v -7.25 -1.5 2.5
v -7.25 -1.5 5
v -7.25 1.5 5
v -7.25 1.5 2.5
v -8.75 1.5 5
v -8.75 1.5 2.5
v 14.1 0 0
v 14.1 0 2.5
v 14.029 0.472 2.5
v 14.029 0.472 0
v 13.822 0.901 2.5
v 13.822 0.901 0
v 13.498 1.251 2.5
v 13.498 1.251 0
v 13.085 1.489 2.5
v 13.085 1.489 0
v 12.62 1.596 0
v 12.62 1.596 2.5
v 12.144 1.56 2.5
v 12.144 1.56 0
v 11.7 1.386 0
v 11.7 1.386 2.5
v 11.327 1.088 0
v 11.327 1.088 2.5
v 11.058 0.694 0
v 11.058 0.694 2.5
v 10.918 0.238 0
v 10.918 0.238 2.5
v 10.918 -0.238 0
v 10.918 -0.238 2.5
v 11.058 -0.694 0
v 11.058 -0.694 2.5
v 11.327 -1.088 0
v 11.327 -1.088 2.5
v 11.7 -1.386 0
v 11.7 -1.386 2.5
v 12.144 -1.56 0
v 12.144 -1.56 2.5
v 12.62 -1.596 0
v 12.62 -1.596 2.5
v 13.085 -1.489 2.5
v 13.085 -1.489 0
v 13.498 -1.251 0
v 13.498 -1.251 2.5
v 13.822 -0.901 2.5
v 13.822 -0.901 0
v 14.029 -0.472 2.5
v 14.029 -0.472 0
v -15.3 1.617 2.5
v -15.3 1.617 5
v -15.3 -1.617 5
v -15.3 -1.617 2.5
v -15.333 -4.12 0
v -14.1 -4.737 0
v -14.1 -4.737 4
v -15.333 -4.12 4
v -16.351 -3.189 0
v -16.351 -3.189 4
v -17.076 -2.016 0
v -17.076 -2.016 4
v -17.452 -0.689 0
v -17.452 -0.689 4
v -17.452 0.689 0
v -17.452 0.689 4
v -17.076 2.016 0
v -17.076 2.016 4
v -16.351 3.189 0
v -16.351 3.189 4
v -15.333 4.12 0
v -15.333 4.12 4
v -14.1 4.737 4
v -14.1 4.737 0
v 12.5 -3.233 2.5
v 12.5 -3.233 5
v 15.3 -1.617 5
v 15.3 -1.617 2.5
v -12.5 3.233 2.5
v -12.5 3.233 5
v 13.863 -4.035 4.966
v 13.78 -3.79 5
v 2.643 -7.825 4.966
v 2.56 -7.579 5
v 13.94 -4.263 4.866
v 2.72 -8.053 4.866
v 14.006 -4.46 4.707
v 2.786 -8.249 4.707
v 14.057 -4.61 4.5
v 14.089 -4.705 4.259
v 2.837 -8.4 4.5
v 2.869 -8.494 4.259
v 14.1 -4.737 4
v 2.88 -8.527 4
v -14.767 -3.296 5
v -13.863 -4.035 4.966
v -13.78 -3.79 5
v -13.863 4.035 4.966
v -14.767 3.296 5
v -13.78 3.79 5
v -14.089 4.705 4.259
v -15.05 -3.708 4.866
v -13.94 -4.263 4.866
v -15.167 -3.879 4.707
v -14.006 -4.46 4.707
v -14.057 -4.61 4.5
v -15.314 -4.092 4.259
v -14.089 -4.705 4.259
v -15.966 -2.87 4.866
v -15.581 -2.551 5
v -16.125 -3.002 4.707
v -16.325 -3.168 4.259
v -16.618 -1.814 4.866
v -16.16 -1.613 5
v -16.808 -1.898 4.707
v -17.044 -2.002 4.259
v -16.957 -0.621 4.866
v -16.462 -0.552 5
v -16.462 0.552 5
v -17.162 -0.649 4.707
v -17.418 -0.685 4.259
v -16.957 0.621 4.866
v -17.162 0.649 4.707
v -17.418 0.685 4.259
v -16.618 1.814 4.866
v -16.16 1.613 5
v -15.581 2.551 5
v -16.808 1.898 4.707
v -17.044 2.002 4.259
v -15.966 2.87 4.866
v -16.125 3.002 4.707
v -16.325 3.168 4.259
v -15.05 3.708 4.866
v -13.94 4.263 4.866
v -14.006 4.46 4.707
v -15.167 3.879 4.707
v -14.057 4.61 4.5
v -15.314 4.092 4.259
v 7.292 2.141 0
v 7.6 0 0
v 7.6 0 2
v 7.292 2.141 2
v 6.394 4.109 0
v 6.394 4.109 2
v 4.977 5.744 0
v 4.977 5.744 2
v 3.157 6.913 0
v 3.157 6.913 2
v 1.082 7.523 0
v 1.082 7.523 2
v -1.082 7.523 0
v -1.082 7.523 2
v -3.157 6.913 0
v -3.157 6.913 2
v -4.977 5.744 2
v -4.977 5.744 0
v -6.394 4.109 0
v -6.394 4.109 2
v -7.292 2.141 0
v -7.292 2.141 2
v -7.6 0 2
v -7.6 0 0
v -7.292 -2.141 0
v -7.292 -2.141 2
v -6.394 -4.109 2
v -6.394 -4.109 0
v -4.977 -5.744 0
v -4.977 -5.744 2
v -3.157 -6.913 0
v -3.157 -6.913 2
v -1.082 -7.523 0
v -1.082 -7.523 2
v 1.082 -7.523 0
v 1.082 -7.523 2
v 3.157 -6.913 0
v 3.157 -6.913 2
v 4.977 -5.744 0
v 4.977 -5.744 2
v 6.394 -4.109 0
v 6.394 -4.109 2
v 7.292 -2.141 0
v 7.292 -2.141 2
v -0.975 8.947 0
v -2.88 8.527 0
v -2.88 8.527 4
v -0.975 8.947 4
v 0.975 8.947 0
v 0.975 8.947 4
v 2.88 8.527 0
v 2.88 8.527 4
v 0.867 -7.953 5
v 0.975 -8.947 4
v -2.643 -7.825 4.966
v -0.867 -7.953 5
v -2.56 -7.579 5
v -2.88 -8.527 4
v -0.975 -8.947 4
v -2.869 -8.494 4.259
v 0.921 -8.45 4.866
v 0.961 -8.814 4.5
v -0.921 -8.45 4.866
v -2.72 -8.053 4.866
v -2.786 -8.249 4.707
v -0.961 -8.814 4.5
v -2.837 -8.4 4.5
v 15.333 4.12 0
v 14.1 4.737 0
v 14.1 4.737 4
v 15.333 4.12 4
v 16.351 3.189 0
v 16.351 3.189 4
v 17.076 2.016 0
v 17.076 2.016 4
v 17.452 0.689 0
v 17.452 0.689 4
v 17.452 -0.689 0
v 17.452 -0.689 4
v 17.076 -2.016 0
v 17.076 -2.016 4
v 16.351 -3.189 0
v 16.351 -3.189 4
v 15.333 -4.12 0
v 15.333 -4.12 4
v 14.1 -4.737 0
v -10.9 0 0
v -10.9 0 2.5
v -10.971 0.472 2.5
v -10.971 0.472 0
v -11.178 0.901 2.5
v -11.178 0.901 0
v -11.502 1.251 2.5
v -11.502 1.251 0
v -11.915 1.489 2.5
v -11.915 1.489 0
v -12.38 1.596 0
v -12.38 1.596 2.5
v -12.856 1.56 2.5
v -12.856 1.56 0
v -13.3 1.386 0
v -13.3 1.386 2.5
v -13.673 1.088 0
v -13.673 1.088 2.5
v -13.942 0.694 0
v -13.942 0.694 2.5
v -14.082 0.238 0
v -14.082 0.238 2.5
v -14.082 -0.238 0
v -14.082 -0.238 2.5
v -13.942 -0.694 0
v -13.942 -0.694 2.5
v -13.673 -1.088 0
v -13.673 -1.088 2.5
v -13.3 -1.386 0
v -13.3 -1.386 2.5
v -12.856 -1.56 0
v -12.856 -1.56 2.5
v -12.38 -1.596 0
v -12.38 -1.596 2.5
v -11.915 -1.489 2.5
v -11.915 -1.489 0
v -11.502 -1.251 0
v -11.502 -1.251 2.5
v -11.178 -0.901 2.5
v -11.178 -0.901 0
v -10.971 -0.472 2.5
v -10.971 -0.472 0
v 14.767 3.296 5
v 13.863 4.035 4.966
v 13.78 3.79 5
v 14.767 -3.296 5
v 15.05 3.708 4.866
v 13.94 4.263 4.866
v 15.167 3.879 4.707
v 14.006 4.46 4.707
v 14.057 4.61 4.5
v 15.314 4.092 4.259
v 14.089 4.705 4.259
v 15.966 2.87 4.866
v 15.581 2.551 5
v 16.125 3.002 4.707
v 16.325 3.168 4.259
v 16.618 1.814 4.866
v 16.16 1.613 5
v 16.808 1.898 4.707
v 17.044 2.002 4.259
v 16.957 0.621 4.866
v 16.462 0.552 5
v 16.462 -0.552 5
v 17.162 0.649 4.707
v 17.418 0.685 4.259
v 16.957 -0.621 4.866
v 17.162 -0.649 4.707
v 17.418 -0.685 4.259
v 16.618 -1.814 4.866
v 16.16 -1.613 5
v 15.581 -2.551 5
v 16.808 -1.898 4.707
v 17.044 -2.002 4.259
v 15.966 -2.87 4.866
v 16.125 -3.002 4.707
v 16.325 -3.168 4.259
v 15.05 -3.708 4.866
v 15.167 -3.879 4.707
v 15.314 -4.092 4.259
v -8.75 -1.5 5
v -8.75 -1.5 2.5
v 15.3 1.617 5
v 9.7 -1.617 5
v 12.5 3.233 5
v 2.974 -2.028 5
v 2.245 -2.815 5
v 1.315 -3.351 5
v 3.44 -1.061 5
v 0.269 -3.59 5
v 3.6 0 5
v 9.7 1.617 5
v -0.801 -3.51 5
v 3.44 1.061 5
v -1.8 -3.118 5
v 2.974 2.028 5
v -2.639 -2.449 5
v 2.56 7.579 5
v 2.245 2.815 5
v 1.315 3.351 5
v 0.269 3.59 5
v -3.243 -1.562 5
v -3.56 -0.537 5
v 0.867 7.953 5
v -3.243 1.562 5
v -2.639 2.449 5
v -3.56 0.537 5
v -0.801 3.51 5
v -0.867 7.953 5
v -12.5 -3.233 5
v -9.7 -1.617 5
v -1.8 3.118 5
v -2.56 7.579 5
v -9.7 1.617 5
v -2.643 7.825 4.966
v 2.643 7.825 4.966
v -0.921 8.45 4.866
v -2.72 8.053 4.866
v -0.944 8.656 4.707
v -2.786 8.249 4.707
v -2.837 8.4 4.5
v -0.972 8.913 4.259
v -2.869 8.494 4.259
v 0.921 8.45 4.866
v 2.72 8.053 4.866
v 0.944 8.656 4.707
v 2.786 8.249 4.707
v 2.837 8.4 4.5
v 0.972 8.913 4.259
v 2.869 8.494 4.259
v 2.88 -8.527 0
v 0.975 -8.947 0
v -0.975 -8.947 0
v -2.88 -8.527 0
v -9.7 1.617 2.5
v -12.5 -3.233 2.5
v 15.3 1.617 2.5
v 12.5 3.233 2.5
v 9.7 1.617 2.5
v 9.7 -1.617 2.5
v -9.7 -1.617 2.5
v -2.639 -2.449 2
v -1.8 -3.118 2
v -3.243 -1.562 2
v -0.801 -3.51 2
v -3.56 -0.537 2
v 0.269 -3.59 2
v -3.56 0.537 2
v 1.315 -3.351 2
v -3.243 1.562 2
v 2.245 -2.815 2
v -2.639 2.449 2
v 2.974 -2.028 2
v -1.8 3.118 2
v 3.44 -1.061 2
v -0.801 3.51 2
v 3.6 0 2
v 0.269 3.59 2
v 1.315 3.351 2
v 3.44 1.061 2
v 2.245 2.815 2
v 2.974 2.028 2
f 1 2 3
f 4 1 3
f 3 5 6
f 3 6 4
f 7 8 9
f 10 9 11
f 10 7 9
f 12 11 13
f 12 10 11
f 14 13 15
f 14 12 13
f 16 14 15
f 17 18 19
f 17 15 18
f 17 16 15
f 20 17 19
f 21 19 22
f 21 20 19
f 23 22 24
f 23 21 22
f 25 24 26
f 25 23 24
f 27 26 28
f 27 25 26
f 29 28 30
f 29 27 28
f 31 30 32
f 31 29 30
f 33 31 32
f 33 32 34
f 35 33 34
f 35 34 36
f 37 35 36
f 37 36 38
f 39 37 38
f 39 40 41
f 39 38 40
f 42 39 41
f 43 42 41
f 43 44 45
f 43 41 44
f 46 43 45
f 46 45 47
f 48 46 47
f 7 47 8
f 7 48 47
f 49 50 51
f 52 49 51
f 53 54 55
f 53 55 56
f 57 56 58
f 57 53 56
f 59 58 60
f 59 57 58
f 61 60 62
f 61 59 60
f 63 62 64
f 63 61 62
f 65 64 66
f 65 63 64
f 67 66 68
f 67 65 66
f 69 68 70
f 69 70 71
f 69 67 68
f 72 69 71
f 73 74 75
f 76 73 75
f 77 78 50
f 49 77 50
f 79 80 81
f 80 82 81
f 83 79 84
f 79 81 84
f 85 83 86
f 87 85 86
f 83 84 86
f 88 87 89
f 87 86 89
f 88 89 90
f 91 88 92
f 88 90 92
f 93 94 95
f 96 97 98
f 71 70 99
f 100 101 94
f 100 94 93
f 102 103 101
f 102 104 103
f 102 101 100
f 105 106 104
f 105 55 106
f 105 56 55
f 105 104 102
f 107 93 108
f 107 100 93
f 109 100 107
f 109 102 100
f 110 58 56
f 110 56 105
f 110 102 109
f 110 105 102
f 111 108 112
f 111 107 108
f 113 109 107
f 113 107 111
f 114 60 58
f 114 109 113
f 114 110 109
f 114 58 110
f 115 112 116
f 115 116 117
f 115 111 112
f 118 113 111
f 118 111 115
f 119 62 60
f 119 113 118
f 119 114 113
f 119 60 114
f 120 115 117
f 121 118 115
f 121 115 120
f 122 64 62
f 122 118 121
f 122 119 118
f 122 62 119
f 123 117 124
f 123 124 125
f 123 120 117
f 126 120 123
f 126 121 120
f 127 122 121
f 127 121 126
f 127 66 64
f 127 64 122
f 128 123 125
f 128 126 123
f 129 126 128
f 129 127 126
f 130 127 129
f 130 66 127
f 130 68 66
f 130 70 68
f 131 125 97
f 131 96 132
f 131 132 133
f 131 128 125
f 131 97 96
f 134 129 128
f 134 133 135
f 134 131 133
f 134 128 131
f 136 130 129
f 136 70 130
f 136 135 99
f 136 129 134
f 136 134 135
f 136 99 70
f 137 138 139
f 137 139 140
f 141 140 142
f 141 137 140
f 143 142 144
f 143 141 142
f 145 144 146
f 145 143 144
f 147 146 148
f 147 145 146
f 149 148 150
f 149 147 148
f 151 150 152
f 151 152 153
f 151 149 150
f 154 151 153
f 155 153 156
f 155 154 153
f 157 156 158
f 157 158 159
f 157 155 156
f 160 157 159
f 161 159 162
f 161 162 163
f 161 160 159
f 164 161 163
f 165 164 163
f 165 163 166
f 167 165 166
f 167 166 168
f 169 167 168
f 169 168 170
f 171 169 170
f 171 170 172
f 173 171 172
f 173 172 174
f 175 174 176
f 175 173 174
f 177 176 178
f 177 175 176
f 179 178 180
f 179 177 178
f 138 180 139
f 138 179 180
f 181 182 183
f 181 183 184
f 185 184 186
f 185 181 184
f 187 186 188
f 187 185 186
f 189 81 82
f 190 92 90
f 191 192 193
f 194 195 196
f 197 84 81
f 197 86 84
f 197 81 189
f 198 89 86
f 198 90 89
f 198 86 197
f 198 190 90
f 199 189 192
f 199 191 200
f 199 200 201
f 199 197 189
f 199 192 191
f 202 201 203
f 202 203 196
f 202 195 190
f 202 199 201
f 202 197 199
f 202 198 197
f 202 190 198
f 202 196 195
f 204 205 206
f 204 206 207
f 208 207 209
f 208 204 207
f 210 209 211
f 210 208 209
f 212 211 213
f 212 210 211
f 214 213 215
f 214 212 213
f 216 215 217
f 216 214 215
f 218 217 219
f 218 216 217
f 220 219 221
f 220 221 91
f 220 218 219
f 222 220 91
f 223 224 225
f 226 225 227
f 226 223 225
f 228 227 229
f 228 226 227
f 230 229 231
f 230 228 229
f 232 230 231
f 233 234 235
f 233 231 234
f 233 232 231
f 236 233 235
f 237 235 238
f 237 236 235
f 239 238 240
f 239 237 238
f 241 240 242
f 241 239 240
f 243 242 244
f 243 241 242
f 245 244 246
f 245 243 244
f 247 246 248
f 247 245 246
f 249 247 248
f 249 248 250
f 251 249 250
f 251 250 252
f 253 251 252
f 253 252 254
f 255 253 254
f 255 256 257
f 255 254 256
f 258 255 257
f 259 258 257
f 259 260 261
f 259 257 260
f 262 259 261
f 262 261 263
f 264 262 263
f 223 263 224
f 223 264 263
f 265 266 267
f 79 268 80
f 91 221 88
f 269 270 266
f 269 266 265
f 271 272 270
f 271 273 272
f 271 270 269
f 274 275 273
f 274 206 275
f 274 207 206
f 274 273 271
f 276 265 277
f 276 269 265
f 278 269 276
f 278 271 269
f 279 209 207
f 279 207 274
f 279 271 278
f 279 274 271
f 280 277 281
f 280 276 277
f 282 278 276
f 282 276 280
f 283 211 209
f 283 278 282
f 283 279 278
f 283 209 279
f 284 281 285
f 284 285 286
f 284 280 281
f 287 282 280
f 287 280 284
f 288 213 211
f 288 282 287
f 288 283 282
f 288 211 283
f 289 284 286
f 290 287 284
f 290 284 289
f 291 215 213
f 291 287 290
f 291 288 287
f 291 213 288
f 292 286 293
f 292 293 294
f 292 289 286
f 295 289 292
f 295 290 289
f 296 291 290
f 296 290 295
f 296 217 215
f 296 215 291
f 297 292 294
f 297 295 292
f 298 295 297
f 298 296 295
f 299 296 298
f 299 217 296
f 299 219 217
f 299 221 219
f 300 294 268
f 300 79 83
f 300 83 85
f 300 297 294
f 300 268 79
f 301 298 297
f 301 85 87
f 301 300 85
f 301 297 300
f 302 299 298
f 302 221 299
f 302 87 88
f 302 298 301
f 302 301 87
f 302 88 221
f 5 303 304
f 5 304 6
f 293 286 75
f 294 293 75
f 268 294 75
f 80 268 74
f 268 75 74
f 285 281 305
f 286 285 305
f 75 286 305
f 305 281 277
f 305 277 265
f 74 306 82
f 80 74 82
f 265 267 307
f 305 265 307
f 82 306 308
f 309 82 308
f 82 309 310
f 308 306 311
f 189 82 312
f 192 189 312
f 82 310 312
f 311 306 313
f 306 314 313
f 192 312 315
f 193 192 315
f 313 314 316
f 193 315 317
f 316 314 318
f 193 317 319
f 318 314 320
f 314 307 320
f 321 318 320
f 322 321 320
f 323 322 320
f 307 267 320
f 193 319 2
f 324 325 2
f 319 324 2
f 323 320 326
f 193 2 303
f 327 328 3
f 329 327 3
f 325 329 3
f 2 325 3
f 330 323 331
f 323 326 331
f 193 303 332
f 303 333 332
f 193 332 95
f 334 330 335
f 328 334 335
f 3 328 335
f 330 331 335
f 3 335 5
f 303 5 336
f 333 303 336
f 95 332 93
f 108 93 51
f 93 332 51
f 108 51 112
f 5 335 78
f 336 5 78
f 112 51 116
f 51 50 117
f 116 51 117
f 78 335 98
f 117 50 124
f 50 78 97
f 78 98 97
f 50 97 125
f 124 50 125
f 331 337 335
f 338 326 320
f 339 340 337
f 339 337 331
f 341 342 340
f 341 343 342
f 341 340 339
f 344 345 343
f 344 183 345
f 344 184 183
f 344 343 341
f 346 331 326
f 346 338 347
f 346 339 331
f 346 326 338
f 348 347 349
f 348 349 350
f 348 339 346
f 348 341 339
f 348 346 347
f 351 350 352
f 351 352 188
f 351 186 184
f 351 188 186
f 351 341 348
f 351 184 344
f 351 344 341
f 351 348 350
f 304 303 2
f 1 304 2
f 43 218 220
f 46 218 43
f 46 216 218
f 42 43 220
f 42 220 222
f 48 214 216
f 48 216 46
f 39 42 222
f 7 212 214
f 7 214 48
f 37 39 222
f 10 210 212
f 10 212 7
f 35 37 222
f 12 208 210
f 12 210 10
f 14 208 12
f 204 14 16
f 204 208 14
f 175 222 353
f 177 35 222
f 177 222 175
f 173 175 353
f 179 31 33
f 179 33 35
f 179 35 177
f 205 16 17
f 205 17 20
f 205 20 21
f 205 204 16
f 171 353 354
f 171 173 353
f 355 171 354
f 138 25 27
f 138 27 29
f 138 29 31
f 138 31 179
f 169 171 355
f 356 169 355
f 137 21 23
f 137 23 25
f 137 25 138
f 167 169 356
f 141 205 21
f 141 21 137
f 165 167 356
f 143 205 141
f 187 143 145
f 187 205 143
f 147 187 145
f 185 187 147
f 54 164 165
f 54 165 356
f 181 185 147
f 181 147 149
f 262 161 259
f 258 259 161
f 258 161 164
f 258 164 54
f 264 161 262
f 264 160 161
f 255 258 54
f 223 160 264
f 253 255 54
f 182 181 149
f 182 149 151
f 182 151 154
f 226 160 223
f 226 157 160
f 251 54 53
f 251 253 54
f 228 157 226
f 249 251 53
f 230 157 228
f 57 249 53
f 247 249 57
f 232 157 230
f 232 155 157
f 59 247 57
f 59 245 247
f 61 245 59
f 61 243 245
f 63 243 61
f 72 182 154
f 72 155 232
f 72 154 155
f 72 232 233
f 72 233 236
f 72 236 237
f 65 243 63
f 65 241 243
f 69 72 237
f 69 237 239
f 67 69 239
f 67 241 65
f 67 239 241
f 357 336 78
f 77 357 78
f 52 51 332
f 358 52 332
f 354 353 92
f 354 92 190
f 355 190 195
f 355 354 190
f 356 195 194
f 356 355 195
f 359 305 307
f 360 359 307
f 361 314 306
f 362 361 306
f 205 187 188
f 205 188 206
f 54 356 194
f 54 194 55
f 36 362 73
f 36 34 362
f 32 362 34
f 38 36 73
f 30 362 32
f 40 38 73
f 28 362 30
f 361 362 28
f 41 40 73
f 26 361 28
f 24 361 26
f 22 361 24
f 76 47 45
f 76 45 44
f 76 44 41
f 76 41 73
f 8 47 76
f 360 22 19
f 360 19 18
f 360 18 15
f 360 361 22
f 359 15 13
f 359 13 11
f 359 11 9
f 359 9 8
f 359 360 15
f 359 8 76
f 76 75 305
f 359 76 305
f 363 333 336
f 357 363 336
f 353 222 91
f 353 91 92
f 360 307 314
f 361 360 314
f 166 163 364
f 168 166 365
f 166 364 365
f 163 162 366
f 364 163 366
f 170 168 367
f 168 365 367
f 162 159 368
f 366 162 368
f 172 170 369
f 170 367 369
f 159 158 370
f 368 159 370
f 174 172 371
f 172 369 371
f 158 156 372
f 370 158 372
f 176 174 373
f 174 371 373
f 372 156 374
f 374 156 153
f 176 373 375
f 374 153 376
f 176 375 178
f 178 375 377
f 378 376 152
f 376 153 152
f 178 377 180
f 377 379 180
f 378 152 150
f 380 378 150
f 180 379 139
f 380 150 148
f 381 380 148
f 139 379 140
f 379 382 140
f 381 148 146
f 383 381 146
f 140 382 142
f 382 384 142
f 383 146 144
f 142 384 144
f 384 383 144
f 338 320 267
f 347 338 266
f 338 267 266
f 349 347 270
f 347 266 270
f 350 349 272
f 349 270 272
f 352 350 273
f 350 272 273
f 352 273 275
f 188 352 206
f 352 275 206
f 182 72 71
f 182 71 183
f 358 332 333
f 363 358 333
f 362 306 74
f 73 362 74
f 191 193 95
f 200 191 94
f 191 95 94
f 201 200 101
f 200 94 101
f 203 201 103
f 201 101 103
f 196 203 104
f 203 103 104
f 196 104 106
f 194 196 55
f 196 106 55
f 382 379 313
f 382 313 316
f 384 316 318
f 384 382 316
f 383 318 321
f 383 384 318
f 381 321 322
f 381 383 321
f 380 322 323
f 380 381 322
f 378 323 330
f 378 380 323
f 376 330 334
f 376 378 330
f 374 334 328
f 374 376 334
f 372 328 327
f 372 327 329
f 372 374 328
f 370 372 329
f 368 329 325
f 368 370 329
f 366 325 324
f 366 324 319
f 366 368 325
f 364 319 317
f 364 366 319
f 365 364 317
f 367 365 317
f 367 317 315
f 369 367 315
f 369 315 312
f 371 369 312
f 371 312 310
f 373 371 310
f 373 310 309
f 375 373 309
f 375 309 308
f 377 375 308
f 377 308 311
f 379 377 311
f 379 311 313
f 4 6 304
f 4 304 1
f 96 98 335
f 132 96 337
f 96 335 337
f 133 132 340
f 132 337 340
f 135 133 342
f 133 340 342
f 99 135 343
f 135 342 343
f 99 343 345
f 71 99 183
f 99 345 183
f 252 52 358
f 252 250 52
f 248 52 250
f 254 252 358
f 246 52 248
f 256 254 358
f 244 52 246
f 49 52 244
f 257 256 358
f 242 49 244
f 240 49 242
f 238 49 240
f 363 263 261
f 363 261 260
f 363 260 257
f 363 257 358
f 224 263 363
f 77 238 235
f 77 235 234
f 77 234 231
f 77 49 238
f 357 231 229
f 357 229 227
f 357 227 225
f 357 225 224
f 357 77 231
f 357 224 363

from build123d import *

# Parameters (mm, degrees)
EXTRUDE_1_DEPTH     = 5
SKETCH_1_3_R        = 7.6
CUT_EXTRUDE_1_DEPTH = 2
SKETCH_1_4_R        = 3.6
SKETCH_1_4_R_2      = 1.6
CUT_EXTRUDE_2_DEPTH = 5
CUT_EXTRUDE_START   = 5
SKETCH_1_5_W        = 1.5
SKETCH_1_5_H        = 3
CUT_EXTRUDE_3_DEPTH = 2.5
CUT_EXTRUDE_4_DEPTH = 2.5
FILLET_1_R          = 1


with BuildPart() as part:
    # Эскиз1 → Бобышка-Вытянуть1 (new body)
    with BuildSketch(Plane.XY):
        with BuildLine():
            Line((-14.1, 4.737087713), (-2.88, 8.526757883))
            ThreePointArc((-2.88, 8.526757883), (0, 9), (2.88, 8.526757883))
            Line((2.88, 8.526757883), (14.1, 4.737087713))
            ThreePointArc((14.1, 4.737087713), (17.5, 0), (14.1, -4.737087713))
            Line((14.1, -4.737087713), (2.88, -8.526757883))
            ThreePointArc((2.88, -8.526757883), (0, -9), (-2.88, -8.526757883))
            Line((-2.88, -8.526757883), (-14.1, -4.737087713))
            ThreePointArc((-14.1, -4.737087713), (-17.5, 0), (-14.1, 4.737087713))
        make_face()
    extrude(amount=EXTRUDE_1_DEPTH)

    # Эскиз1<3> → Вырез-Вытянуть1 (cut)
    with BuildSketch(Plane.XY):
        Circle(SKETCH_1_3_R)
    extrude(amount=CUT_EXTRUDE_1_DEPTH, mode=Mode.SUBTRACT)

    # Эскиз1<4> → Вырез-Вытянуть2 (cut)
    with BuildSketch(Plane.XY):
        Circle(SKETCH_1_4_R)
        with Locations((-12.5, 0)):
            Circle(SKETCH_1_4_R_2)
        with Locations((12.5, 0)):
            Circle(SKETCH_1_4_R_2)
    extrude(amount=CUT_EXTRUDE_2_DEPTH, mode=Mode.SUBTRACT)

    # Эскиз1<5> → Вырез-Вытянуть3 (cut)
    with BuildSketch(Plane.XY.offset(CUT_EXTRUDE_START)):
        with Locations((-8, 0)):
            Rectangle(SKETCH_1_5_W, SKETCH_1_5_H)
    extrude(amount=-CUT_EXTRUDE_3_DEPTH, mode=Mode.SUBTRACT)

    # Эскиз2 → Вырез-Вытянуть4 (cut)
    with BuildSketch(Plane.XY.offset(5)):
        Polygon((-12.5, 3.233161507), (-15.3, 1.616580754), (-15.3, -1.616580754), (-12.5, -3.233161507), (-9.7, -1.616580754), (-9.7, 1.616580754), align=None)
        Polygon((12.5, 3.233161507), (9.7, 1.616580754), (9.7, -1.616580754), (12.5, -3.233161507), (15.3, -1.616580754), (15.3, 1.616580754), align=None)
    extrude(amount=-CUT_EXTRUDE_4_DEPTH, mode=Mode.SUBTRACT)

    # Скругление1
    fillet_1_edges = [part.edges().sort_by_distance(p)[0] for p in [
        (0, -9, 5),
        (-8.49, -6.631922798, 5),
        (-17.5, 0, 5),
        (-8.49, 6.631922798, 5),
        (0, 9, 5),
        (8.49, 6.631922798, 5),
        (17.5, 0, 5),
        (8.49, -6.631922798, 5),
    ]]
    fillet(fillet_1_edges, radius=FILLET_1_R)


solid = part.part
